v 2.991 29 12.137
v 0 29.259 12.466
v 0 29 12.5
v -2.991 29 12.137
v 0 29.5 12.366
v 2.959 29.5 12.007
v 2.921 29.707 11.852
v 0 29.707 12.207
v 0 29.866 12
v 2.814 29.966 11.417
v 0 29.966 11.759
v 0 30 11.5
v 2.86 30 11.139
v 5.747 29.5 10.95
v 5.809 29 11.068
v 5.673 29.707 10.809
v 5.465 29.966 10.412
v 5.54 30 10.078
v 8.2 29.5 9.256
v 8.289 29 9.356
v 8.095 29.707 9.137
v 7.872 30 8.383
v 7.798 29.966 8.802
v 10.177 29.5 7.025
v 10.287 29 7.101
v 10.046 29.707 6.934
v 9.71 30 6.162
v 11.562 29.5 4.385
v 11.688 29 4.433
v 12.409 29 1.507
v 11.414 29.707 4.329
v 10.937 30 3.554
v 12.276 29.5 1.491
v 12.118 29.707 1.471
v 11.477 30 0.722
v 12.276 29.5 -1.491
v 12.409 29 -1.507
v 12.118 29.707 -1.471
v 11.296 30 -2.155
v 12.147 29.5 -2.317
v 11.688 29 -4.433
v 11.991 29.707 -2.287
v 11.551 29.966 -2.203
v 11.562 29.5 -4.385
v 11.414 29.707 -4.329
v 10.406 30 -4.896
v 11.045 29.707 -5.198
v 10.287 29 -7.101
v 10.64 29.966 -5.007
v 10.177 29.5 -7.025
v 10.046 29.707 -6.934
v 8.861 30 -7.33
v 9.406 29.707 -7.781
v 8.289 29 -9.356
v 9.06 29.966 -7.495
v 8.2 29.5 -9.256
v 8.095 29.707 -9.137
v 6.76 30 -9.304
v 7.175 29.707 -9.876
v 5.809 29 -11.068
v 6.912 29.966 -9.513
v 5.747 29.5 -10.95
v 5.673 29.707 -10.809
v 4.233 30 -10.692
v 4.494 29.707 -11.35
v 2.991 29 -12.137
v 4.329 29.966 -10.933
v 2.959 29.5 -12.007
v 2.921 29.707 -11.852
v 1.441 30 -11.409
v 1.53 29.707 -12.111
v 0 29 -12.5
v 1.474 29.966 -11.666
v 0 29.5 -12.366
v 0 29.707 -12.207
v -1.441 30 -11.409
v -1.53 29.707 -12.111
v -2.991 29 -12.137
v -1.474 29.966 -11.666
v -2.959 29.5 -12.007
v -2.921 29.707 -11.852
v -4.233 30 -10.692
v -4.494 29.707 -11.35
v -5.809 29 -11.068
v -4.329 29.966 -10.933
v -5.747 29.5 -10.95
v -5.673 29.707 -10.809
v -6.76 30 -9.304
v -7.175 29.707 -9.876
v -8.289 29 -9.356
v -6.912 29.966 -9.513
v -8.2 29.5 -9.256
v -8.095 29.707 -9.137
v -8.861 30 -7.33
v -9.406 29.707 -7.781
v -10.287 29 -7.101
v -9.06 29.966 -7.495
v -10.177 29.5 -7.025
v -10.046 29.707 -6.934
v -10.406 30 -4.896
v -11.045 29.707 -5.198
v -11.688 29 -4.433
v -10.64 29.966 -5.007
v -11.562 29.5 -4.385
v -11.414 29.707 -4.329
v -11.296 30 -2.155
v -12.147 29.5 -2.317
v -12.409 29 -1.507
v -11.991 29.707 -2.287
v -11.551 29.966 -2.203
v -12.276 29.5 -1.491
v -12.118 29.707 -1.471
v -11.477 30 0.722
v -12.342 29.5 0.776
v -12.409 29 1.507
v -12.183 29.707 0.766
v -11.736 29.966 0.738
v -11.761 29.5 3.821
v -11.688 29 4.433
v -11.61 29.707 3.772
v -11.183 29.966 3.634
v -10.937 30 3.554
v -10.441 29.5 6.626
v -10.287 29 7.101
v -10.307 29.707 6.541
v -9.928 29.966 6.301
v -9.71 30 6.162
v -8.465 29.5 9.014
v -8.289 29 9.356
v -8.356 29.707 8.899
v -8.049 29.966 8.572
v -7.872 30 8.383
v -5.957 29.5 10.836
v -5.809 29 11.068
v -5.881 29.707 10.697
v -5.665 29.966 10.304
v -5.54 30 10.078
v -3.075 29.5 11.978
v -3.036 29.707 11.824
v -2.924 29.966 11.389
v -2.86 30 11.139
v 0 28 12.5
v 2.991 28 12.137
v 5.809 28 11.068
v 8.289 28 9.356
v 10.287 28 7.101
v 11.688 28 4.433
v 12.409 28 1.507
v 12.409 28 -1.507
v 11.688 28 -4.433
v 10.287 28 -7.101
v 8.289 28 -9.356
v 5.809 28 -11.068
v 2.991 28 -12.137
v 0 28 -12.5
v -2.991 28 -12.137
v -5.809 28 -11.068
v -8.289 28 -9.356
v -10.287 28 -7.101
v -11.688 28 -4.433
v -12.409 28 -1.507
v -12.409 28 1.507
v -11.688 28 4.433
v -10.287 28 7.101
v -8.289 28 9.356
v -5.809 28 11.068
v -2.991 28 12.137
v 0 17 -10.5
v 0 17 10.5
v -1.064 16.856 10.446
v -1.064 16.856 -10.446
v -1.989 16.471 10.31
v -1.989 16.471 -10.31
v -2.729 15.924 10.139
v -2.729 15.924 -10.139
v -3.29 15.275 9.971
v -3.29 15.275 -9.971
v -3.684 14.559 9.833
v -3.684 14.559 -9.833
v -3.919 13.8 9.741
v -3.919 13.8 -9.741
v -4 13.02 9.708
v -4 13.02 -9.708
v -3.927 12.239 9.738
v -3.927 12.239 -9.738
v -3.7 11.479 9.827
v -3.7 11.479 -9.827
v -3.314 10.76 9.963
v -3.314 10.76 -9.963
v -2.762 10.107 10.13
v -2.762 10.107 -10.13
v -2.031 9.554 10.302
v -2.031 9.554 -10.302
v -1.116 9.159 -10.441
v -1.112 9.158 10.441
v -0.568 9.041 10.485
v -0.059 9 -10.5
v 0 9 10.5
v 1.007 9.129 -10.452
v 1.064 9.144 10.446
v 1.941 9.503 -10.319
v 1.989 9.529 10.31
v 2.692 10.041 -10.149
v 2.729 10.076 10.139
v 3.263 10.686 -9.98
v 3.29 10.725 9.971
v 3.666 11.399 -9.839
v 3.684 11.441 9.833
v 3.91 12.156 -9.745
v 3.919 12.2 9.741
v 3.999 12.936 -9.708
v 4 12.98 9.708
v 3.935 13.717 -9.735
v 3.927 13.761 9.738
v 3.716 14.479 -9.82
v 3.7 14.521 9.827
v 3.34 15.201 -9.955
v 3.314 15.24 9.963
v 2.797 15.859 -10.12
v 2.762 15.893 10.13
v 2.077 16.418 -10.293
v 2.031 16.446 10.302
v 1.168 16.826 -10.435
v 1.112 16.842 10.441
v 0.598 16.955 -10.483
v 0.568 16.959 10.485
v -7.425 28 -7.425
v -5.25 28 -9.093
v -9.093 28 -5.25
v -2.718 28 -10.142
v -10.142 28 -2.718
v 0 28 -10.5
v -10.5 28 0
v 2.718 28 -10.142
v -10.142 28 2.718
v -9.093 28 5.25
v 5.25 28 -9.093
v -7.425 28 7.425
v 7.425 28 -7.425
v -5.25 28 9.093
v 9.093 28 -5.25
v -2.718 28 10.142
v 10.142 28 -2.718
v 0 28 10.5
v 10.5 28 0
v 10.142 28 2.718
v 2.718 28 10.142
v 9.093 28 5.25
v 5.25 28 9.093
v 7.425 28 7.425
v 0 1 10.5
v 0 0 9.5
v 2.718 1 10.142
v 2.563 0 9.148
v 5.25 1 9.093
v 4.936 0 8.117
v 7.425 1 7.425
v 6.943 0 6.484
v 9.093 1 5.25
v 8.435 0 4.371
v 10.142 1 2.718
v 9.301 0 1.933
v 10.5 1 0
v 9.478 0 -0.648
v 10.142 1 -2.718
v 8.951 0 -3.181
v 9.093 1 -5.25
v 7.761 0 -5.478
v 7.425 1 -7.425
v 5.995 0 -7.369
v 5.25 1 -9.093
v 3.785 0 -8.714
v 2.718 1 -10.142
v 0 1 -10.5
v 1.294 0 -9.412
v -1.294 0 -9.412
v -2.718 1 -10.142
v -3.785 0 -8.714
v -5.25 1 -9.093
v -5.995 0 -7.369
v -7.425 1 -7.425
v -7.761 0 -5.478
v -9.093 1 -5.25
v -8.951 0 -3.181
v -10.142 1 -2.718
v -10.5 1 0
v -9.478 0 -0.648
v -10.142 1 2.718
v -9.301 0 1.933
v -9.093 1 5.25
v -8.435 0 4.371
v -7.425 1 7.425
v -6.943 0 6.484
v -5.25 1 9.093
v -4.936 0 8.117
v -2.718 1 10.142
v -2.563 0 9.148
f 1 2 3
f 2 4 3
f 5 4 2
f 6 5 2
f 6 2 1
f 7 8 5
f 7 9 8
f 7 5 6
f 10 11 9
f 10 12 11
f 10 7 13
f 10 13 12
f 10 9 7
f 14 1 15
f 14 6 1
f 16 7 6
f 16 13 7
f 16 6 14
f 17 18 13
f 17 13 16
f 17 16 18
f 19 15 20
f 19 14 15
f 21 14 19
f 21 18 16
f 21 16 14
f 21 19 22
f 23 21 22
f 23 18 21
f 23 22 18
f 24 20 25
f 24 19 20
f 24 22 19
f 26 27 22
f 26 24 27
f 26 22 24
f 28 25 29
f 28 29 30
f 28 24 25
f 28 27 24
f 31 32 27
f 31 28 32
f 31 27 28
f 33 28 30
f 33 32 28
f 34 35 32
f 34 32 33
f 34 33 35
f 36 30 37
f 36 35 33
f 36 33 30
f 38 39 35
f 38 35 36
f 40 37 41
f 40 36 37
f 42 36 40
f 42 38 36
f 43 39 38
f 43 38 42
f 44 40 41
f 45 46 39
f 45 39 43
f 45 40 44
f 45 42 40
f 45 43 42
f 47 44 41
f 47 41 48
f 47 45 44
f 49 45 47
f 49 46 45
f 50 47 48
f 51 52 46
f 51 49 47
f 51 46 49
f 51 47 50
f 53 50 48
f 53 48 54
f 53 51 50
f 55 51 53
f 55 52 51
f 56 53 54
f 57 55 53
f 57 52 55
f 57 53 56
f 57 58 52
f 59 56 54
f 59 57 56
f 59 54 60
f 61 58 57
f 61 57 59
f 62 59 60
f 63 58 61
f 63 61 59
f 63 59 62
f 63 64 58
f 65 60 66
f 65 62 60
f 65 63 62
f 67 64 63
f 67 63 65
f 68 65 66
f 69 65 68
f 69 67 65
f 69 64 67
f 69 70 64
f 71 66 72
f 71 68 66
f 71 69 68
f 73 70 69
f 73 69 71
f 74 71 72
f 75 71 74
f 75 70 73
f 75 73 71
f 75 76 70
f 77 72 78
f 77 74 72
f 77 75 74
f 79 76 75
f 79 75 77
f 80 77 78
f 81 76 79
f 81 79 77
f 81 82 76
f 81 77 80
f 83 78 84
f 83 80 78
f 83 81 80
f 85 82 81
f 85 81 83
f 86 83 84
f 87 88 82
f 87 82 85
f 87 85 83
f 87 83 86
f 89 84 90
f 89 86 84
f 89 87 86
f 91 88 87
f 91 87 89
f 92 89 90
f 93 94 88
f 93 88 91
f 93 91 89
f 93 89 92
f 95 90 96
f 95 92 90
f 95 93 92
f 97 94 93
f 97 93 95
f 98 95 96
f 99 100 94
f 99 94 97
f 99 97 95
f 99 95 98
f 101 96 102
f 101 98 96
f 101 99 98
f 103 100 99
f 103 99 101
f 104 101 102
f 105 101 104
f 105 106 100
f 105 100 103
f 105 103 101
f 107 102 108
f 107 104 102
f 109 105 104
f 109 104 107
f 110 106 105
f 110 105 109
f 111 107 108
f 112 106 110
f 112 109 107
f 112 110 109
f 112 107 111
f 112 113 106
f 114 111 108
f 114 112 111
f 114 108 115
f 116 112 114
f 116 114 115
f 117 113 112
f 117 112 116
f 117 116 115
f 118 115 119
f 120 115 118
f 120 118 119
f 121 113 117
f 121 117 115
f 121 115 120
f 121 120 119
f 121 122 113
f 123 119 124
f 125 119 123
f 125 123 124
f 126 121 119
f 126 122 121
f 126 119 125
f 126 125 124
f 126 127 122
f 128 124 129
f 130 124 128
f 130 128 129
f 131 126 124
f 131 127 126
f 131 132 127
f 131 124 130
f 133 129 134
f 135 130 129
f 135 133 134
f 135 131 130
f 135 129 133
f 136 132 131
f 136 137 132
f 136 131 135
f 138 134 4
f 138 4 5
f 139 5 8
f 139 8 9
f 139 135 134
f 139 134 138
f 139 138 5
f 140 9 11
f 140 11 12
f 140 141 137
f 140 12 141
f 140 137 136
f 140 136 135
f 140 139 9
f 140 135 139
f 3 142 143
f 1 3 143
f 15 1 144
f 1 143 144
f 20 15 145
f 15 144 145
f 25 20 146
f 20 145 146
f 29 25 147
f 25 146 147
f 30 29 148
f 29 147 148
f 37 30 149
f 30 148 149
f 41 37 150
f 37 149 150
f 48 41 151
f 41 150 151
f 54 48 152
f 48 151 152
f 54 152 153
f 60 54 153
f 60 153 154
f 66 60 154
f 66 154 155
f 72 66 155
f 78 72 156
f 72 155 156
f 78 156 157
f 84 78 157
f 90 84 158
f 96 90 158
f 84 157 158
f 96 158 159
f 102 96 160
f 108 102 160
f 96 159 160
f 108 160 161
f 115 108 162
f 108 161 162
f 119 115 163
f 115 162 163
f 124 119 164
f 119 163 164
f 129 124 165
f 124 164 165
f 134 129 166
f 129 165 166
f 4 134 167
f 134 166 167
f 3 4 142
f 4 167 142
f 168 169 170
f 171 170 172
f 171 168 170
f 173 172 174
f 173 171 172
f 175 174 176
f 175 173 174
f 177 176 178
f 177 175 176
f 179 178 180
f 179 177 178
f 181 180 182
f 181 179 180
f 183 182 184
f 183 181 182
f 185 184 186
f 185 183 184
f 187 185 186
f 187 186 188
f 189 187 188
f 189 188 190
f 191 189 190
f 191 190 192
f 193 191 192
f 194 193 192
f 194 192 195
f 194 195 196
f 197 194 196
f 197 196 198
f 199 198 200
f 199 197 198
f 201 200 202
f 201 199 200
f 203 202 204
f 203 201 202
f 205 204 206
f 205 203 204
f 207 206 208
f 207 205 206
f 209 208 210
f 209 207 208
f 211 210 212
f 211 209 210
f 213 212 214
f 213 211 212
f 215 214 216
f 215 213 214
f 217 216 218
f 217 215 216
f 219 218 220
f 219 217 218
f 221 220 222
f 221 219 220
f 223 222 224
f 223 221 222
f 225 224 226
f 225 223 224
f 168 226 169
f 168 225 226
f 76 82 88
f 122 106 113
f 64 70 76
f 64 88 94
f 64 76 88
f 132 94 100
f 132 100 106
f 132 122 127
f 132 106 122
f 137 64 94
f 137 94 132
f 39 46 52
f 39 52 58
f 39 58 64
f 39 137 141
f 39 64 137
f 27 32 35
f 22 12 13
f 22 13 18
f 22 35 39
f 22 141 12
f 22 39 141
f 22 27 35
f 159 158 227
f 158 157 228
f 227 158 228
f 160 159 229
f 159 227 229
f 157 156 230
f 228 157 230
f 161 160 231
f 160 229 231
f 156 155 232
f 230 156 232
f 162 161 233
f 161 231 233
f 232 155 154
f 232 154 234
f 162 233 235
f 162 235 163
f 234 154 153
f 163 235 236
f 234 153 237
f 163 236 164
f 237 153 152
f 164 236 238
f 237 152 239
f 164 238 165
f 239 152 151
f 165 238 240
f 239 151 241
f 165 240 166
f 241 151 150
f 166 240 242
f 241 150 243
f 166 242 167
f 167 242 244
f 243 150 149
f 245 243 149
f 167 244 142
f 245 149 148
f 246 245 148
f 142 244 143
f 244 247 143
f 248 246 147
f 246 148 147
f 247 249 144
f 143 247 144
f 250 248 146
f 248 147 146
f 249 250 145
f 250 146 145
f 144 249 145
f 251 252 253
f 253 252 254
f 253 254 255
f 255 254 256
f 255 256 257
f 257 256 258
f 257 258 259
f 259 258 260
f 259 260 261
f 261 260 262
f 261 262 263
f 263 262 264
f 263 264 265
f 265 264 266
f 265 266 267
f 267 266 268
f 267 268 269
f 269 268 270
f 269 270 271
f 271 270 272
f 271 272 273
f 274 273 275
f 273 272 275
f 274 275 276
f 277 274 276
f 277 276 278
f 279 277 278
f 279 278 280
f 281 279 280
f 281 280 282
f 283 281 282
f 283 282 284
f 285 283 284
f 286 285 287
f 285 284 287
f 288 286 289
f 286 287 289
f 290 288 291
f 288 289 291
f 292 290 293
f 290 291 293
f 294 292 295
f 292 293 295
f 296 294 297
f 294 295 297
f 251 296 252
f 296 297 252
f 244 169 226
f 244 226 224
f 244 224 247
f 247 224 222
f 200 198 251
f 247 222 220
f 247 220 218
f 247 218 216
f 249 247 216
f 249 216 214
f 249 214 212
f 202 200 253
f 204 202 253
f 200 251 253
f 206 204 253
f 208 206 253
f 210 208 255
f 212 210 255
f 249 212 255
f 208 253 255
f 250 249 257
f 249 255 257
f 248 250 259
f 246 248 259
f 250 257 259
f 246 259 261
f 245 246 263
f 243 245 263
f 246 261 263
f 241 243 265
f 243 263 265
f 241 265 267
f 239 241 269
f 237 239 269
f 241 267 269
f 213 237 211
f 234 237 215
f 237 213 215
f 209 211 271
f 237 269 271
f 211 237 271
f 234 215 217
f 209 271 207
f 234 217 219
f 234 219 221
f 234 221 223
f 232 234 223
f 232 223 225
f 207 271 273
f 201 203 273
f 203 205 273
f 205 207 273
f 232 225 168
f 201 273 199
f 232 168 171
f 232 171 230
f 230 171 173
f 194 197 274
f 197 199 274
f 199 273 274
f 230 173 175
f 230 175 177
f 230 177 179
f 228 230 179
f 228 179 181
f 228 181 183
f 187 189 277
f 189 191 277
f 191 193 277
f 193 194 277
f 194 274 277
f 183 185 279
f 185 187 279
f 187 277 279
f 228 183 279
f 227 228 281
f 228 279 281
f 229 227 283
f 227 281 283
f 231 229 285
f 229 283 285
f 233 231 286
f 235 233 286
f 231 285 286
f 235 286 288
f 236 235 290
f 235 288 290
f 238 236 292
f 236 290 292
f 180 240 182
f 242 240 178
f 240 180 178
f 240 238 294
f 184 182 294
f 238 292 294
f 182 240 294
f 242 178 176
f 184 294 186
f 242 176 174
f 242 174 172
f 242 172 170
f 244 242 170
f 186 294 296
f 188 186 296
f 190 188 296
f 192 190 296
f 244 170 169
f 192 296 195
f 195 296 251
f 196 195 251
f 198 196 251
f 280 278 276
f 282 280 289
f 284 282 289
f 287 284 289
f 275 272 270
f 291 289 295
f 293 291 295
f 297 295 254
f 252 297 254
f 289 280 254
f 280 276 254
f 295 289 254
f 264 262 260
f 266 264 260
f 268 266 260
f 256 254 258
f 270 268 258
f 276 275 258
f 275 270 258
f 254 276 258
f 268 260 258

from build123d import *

# Parameters (mm, degrees)
SKETCH_1_R               = 10.5
EXTRUDE_1_DEPTH          = 28
SKETCH_2_R               = 12.5
EXTRUDE_2_DEPTH          = 2
FILLET_1_R               = 1
CHAMFER_1_SIZE           = 1
CUT_EXTRUDE_1_DEPTH      = 35.820970729
CUT_EXTRUDE_1_DEPTH_BACK = 35.820970729
SKETCH_3_R               = 4


with BuildPart() as part:
    # Эскиз1 → Бобышка-Вытянуть1 (new body)
    with BuildSketch(Plane(origin=(0, 0, 0), x_dir=(1, 0, 0), z_dir=(0, 1, 0))):
        with Locations(Location((0, 0, 0), (0, 0, 270))):
            Circle(SKETCH_1_R)
    extrude(amount=EXTRUDE_1_DEPTH)

    # Эскиз2 → Бобышка-Вытянуть2 (add)
    with BuildSketch(Plane(origin=(0, 28, 0), x_dir=(1, 0, 0), z_dir=(0, 1, 0))):
        with Locations(Location((0, 0, 0), (0, 0, 270))):
            Circle(SKETCH_2_R)
    extrude(amount=EXTRUDE_2_DEPTH)

    # Скругление1
    fillet_1_edges = [part.edges().sort_by_distance(p)[0] for p in [
        (0, 30, -12.5),
    ]]
    fillet(fillet_1_edges, radius=FILLET_1_R)

    # Фаска1
    chamfer_1_edges = [part.edges().sort_by_distance(p)[0] for p in [
        (0, 0, -10.5),
    ]]
    chamfer(chamfer_1_edges, length=CHAMFER_1_SIZE)

    # Эскиз3 → Вырез-Вытянуть1 (cut, two sides: drawn at the far end of the back side and taken through both)
    with BuildSketch(Plane.XY.offset(-CUT_EXTRUDE_1_DEPTH_BACK)):
        with Locations(Location((0, 13, 0), (0, 0, 89.999999999))):
            Circle(SKETCH_3_R)
    extrude(amount=CUT_EXTRUDE_1_DEPTH + CUT_EXTRUDE_1_DEPTH_BACK, mode=Mode.SUBTRACT)


solid = part.part
